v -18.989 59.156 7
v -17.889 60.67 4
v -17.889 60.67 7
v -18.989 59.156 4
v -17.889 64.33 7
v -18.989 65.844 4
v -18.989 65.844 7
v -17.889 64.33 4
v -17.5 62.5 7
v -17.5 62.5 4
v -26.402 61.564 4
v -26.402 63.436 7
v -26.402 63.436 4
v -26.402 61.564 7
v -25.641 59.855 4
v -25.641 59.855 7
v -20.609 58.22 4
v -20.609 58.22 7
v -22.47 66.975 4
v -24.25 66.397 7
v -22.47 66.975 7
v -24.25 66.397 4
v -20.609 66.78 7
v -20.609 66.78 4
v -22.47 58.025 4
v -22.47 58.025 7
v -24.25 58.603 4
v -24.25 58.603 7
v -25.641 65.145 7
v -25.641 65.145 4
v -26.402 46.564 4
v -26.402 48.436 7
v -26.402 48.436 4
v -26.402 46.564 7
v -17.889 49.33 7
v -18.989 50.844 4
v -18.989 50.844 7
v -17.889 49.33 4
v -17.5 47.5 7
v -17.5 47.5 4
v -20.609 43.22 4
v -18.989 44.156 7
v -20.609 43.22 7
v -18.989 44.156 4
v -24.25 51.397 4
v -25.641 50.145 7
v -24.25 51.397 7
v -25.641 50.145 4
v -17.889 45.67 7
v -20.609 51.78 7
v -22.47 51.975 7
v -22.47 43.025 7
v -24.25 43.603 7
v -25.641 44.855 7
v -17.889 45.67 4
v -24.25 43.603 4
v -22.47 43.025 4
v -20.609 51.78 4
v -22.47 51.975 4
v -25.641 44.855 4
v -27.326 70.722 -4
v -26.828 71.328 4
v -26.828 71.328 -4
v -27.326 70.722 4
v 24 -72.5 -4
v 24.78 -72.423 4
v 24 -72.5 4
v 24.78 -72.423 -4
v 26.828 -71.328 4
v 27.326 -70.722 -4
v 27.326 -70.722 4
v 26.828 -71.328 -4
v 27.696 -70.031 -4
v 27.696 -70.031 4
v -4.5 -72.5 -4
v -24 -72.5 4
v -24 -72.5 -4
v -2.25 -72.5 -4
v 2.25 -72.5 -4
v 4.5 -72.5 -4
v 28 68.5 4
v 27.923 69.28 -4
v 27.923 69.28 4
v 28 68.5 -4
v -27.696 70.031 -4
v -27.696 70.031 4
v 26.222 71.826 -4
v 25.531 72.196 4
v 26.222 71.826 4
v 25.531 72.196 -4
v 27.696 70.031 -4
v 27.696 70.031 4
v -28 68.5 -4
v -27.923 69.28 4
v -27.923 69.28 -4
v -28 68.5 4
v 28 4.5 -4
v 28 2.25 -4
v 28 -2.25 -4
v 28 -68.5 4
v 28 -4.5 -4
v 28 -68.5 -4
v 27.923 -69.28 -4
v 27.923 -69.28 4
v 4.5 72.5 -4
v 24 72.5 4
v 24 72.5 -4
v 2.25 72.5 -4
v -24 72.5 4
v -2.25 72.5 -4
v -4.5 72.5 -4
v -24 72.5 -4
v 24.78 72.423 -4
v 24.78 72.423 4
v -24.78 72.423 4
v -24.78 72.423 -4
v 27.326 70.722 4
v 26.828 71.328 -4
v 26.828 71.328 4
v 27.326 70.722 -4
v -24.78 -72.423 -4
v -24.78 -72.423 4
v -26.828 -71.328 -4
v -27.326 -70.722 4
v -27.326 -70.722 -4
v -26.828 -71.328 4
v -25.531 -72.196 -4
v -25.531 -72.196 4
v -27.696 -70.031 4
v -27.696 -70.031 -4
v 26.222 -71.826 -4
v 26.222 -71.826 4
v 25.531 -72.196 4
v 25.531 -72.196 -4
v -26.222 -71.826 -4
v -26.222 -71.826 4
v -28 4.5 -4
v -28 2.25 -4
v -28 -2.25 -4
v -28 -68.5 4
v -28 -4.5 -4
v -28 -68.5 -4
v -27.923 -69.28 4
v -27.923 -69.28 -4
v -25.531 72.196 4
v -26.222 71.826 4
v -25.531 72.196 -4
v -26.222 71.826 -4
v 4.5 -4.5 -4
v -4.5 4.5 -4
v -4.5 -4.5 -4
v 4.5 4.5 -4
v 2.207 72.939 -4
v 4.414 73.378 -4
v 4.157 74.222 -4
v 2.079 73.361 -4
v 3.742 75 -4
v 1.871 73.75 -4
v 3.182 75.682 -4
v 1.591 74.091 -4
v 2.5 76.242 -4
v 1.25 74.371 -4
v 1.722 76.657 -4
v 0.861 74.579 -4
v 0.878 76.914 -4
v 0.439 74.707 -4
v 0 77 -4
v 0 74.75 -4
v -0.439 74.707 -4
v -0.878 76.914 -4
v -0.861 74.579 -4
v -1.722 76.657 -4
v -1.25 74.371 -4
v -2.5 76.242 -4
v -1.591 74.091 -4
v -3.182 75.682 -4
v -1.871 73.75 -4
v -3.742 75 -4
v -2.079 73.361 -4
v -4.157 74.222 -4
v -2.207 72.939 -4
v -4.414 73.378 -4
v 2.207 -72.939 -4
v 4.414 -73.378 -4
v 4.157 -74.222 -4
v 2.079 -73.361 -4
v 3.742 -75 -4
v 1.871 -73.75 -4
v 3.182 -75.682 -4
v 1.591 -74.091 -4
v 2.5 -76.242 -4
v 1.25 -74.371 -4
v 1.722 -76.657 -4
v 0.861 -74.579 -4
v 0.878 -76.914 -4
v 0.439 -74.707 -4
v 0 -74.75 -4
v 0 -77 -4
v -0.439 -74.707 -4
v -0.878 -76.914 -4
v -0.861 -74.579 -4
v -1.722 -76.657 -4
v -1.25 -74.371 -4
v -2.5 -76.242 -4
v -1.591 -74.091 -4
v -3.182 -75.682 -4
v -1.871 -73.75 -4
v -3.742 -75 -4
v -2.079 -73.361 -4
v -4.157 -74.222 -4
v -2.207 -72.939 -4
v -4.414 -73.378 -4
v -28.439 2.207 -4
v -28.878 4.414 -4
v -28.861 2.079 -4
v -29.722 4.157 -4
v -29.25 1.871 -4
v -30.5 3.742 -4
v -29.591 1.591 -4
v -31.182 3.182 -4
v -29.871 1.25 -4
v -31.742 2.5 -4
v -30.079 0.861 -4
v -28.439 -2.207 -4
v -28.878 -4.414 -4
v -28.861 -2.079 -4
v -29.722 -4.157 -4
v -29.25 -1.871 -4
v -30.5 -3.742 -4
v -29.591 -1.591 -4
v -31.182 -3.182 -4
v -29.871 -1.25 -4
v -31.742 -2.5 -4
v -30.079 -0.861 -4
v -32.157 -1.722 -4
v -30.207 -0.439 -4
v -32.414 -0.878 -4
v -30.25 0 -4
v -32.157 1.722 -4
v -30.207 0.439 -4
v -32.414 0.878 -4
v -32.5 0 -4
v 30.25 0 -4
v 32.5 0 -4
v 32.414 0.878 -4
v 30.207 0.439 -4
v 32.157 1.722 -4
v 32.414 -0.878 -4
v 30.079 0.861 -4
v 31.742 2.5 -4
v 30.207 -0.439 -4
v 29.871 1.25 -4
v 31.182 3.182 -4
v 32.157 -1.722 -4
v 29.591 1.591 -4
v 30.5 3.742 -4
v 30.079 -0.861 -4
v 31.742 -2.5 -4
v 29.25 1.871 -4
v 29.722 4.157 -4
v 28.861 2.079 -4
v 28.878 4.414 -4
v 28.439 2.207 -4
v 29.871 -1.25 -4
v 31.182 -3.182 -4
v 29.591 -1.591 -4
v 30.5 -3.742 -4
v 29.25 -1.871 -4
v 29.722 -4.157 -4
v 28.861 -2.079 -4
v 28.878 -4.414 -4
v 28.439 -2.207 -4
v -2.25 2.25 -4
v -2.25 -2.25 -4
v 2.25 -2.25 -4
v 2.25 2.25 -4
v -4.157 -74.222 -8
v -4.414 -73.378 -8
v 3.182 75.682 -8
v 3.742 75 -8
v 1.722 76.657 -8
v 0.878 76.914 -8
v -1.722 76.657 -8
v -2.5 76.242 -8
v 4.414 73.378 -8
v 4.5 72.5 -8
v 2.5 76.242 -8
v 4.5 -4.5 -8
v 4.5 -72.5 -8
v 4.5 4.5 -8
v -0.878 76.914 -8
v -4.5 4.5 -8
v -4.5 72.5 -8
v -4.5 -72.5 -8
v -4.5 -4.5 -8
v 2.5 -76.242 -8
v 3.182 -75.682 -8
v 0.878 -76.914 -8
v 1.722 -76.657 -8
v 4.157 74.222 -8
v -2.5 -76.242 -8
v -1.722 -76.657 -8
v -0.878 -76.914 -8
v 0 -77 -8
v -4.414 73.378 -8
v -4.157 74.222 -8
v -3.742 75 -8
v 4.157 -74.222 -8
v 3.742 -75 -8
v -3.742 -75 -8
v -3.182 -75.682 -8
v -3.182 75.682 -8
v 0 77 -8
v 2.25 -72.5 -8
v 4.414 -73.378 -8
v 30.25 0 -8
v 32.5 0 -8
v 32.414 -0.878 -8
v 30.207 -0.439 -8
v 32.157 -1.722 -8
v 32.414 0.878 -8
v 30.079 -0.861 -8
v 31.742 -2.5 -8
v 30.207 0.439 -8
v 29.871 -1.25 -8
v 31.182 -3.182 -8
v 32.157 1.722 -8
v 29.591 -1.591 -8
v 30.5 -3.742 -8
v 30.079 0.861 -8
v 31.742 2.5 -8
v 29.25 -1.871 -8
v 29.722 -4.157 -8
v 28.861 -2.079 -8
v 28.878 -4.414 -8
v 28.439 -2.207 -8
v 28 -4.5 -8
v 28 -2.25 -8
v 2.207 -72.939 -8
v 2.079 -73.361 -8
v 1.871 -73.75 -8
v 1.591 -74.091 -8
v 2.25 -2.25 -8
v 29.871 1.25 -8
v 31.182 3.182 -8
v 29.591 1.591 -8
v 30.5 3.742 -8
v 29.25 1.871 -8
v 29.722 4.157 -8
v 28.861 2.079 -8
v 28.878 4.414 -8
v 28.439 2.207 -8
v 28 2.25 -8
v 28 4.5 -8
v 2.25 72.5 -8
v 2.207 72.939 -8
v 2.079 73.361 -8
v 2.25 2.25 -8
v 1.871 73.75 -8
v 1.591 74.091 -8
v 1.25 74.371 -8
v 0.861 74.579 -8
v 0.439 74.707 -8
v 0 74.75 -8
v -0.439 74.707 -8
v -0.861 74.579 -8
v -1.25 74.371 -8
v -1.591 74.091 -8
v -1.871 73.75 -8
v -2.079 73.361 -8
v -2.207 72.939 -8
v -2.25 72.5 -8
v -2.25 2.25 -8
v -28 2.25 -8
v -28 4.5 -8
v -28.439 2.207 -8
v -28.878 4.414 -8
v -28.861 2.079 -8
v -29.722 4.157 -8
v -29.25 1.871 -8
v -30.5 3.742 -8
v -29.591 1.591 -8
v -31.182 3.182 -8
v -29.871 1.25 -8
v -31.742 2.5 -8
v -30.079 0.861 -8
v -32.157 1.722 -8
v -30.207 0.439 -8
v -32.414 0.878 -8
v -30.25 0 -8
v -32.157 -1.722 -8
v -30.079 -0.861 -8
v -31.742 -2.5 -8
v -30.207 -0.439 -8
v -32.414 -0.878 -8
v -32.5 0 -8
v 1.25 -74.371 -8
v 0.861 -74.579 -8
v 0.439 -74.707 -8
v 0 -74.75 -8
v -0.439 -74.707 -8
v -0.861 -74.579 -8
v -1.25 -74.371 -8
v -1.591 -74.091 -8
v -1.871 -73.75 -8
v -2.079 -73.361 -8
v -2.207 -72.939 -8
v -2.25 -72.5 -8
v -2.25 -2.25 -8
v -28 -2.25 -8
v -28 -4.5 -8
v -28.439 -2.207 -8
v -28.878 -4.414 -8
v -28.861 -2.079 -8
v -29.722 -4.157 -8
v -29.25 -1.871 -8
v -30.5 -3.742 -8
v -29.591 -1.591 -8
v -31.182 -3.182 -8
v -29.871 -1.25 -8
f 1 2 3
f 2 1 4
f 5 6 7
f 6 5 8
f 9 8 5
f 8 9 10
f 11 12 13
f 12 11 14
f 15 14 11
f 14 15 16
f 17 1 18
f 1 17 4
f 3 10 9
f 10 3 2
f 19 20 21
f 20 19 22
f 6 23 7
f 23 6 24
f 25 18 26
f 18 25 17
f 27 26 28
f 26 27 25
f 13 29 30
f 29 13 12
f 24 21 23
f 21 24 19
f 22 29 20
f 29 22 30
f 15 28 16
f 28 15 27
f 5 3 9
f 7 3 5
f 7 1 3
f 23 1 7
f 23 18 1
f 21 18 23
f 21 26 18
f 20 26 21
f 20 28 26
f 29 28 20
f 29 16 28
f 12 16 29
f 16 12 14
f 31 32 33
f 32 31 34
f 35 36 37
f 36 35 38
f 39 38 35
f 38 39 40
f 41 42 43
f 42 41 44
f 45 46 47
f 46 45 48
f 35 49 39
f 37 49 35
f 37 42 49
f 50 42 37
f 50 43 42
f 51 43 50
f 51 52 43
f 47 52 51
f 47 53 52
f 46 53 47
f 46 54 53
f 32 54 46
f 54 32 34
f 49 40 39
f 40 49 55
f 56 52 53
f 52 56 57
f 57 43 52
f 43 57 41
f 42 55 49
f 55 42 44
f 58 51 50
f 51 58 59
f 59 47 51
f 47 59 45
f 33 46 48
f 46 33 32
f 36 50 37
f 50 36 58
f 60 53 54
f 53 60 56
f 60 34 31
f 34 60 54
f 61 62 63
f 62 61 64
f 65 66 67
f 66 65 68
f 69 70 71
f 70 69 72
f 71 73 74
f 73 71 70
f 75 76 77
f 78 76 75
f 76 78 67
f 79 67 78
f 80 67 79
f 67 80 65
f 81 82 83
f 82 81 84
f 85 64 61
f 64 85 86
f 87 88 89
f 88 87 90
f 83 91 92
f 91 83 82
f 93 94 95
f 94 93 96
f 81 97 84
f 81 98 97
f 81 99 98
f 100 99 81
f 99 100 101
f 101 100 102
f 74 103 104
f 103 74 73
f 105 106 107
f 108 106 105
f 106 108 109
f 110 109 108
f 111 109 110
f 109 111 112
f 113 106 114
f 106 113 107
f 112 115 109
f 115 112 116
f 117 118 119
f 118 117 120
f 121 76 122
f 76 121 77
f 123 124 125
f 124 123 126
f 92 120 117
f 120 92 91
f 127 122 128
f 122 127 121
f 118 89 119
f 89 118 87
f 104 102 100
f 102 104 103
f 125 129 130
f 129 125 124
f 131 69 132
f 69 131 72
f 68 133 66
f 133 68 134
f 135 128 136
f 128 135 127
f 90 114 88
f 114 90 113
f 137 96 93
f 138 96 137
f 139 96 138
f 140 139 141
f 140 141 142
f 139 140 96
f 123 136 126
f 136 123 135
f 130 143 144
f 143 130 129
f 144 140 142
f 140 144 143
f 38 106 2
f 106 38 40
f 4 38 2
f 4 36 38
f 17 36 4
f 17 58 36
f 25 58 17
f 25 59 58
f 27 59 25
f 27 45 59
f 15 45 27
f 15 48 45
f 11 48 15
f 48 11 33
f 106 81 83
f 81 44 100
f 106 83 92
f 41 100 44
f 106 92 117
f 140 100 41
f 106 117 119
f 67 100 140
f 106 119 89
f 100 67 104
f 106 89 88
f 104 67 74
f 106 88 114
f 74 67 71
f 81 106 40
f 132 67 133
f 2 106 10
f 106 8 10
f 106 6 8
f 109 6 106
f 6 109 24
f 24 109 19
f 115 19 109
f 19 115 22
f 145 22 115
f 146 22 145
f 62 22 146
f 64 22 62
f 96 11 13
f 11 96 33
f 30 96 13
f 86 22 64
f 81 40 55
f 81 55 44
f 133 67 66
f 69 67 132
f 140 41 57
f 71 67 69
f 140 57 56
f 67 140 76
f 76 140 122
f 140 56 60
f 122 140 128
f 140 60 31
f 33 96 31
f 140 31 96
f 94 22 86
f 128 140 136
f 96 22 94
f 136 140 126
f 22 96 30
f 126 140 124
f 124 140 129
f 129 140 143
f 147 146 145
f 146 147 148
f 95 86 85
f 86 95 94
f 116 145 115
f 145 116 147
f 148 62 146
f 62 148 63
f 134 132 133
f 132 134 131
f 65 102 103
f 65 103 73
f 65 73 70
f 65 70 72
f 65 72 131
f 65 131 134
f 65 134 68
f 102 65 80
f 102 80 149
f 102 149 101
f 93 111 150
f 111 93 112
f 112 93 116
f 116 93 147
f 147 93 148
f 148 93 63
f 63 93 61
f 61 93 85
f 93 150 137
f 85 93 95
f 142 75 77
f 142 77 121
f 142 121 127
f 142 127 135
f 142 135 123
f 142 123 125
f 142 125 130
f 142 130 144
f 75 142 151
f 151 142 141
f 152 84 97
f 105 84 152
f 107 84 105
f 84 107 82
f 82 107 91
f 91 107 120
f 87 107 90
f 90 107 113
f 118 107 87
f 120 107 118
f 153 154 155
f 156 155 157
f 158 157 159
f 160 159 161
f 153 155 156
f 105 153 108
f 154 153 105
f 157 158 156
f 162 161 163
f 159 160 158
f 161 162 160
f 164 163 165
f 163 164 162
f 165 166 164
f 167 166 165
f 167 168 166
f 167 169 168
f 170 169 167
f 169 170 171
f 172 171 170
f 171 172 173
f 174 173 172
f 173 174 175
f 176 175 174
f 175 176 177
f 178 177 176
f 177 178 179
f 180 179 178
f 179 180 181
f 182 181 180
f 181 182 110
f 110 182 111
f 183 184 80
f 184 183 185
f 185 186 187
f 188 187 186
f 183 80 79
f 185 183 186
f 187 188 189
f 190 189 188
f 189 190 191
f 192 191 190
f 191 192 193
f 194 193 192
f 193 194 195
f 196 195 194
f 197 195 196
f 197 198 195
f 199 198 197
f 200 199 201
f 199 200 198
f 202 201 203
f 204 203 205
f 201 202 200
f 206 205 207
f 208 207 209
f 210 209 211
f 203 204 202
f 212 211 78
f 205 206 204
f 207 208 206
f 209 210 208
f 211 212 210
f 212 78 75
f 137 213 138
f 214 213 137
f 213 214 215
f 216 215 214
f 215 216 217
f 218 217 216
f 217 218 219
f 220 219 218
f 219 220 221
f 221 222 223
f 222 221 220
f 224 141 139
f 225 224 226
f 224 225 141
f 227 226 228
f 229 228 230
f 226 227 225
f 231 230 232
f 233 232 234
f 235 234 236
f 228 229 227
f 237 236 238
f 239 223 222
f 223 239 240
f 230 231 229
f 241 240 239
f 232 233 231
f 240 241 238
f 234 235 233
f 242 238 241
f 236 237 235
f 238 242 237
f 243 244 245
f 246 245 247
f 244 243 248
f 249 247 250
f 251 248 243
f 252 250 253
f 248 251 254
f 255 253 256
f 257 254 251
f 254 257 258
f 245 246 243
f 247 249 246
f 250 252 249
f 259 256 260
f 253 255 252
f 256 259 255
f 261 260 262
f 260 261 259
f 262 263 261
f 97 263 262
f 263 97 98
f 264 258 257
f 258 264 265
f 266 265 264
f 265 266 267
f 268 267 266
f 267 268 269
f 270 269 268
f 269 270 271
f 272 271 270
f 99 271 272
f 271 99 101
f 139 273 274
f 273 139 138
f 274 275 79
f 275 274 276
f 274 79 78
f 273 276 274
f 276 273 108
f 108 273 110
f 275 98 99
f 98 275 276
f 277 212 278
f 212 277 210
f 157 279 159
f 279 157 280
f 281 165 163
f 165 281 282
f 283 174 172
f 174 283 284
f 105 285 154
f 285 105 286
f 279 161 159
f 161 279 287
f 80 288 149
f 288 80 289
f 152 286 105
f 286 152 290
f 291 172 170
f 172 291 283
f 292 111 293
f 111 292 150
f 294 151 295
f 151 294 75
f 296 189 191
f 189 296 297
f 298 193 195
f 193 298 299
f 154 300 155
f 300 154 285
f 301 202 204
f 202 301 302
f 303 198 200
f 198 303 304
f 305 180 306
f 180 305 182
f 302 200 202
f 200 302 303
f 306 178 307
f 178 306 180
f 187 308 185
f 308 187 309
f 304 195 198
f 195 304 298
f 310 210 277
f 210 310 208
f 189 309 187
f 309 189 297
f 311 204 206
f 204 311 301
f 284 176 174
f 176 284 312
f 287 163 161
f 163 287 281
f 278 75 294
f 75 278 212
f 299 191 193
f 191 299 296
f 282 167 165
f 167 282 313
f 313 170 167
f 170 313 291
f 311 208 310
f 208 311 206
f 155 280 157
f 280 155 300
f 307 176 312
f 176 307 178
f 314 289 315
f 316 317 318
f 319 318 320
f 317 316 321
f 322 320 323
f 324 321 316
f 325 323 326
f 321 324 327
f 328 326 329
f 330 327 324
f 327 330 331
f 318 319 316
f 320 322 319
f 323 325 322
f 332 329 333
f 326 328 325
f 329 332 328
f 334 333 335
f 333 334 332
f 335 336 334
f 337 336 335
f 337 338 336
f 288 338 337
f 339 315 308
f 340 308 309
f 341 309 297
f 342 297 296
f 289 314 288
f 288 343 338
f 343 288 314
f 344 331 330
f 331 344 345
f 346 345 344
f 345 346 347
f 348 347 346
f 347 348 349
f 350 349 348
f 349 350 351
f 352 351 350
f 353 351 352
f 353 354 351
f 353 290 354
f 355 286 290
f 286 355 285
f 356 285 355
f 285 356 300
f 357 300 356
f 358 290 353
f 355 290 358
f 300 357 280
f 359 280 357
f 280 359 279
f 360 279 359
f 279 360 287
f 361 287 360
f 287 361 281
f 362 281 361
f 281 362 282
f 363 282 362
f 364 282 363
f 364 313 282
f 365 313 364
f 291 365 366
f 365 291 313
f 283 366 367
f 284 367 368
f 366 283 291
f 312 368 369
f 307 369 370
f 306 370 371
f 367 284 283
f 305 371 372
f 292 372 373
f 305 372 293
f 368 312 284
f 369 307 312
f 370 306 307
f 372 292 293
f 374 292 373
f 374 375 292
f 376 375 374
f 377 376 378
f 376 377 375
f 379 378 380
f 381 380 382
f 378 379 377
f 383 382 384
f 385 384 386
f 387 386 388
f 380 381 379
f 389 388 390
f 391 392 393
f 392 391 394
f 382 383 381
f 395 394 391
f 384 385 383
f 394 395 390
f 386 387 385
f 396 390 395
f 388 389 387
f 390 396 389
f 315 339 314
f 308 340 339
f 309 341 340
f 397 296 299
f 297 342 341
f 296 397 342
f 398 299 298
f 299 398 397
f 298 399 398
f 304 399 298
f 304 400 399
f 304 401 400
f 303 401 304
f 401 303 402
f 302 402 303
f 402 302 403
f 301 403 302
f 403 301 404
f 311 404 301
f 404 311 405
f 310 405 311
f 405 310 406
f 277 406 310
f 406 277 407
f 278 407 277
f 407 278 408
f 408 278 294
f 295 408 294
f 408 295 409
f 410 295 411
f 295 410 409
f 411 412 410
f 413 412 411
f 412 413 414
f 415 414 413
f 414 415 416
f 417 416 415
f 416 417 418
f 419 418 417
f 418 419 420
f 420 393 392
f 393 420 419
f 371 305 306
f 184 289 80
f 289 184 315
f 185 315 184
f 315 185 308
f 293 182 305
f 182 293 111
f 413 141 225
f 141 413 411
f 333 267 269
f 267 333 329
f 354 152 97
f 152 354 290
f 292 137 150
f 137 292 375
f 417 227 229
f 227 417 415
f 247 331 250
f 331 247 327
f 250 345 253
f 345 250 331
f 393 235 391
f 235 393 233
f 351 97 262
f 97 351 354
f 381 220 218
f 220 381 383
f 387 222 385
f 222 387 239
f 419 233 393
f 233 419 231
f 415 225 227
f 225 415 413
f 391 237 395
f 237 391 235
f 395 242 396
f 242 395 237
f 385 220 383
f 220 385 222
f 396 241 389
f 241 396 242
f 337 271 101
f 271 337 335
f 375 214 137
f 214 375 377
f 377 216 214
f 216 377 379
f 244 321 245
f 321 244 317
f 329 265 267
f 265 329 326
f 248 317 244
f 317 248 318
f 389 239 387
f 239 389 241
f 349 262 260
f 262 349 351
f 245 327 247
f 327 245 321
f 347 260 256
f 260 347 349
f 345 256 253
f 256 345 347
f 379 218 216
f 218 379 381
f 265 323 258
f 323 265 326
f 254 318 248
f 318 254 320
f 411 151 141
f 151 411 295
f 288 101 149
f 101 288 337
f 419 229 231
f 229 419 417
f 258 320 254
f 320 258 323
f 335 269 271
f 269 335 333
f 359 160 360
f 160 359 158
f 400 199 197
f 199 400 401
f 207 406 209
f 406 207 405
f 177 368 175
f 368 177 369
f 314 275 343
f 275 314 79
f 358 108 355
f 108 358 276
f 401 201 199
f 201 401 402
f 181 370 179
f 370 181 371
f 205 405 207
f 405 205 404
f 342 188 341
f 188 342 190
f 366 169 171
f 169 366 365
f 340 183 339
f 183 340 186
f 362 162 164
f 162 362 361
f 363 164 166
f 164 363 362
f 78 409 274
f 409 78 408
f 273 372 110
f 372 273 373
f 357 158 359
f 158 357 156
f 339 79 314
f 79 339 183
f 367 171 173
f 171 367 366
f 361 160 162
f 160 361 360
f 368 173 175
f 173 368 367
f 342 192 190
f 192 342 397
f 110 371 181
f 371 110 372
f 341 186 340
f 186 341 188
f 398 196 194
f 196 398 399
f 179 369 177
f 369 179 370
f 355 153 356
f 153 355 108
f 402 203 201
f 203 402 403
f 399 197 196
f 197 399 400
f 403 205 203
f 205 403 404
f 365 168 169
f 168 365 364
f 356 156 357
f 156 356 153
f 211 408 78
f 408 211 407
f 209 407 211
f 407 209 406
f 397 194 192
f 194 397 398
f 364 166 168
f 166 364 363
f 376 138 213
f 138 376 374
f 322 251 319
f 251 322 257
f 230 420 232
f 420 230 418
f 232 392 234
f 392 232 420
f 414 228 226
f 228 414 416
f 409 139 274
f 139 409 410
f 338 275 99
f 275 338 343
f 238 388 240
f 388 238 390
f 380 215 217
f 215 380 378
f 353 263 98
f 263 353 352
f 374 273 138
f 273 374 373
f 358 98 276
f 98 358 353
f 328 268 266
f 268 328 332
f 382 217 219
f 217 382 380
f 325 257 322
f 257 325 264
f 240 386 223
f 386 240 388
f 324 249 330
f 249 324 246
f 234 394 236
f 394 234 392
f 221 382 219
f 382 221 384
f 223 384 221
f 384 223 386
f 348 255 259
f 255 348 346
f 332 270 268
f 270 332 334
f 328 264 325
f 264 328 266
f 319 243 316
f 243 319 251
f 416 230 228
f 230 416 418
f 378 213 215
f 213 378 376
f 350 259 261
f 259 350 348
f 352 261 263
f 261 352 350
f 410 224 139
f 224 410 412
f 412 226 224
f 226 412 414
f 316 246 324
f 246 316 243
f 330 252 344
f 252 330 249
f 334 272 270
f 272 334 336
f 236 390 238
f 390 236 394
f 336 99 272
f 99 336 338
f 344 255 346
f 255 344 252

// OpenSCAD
// file: holder.scad
len_phone = 145;
width_phone = 56;
d_screw_m4 = 4.5;
thickness_holder = 4;

holder_set();

module holder_set() {
    difference(){
        t_cross();
        screw_hole();
    }
}

module t_cross() {
    hull() {
        translate([0, -len_phone/2, 0])
        cylinder(d=9, h=thickness_holder, center=true, $fn=32);

        translate([0, len_phone/2, 0])
        cylinder(d=9, h=thickness_holder, center=true, $fn=32);
    }
    
    hull() {
        translate([width_phone/2, 0, 0])
        cylinder(d=9, h=thickness_holder, center=true, $fn=32);

        translate([-width_phone/2, 0, 0])
        cylinder(d=9, h=thickness_holder, center=true, $fn=32);
    }
    
}

module screw_hole() {
    color("red")
    hull () {
        translate([0, -len_phone/2, 0])
        cylinder(d=d_screw_m4, thickness_holder+2, center=true, $fn=32);
            
        translate([0, len_phone/2, 0])
        cylinder(d=d_screw_m4, thickness_holder+2, center=true, $fn=32);
    }
    
    color("red")
    hull () {
        translate([width_phone/2, 0, 0])
        cylinder(d=d_screw_m4, thickness_holder+2, center=true, $fn=32);
            
        translate([-width_phone/2, 0, 0])
        cylinder(d=d_screw_m4, thickness_holder+2, center=true, $fn=32);
    }
}
// file: smartphone.scad
echo("Работа Вадима Разеева!");
len_phone=145;
width_phone=56;
thickness_phone=8;
corner_round=8;

//color("red")
//translate([0, 0, 10])
//cube([width_phone, len_phone, thickness_phone], center=true);

module smartphone() {
    smartphone_block();
    cameras_block();
}


module cameras_block() {
    color("blue")
    translate([width_phone/2-50, len_phone/2-10, 0])
    cylinder(d=9, h = thickness_phone - 1);

    color("blue")
    translate([width_phone/2-50, len_phone/2-25, 0])
    cylinder(d=9, h = thickness_phone - 1);
}

module smartphone_block(){
    hull() {
        color("red")
        translate([width_phone/2-corner_round/2, len_phone/2-corner_round/2, 0])
        cylinder(h=thickness_phone, d=corner_round, $fn=32, center=true);

        mirror([1,0,0])
        color("red")
        translate([width_phone/2-corner_round/2, len_phone/2-corner_round/2, 0])
        cylinder(h=thickness_phone, d=corner_round, $fn=32, center=true);

        mirror([0,1,0])
        color("red")
        translate([width_phone/2-corner_round/2, len_phone/2-corner_round/2, 0])
        cylinder(h=thickness_phone, d=corner_round, $fn=32, center=true);

        mirror([1,0,0])
        mirror([0,1,0])
        color("red")
        translate([width_phone/2-corner_round/2, len_phone/2-corner_round/2, 0])
        cylinder(h=thickness_phone, d=corner_round, $fn=32, center=true);
    }
}
smartphone();
// main file
use <smartphone.scad>
use <holder.scad>

thickness_phone = 8;
thickness_holder = 4;

echo("Работа Вадима Разеева!");
smartphone();
translate([0, 0, -thickness_phone/2-thickness_holder/2])
holder_set();
